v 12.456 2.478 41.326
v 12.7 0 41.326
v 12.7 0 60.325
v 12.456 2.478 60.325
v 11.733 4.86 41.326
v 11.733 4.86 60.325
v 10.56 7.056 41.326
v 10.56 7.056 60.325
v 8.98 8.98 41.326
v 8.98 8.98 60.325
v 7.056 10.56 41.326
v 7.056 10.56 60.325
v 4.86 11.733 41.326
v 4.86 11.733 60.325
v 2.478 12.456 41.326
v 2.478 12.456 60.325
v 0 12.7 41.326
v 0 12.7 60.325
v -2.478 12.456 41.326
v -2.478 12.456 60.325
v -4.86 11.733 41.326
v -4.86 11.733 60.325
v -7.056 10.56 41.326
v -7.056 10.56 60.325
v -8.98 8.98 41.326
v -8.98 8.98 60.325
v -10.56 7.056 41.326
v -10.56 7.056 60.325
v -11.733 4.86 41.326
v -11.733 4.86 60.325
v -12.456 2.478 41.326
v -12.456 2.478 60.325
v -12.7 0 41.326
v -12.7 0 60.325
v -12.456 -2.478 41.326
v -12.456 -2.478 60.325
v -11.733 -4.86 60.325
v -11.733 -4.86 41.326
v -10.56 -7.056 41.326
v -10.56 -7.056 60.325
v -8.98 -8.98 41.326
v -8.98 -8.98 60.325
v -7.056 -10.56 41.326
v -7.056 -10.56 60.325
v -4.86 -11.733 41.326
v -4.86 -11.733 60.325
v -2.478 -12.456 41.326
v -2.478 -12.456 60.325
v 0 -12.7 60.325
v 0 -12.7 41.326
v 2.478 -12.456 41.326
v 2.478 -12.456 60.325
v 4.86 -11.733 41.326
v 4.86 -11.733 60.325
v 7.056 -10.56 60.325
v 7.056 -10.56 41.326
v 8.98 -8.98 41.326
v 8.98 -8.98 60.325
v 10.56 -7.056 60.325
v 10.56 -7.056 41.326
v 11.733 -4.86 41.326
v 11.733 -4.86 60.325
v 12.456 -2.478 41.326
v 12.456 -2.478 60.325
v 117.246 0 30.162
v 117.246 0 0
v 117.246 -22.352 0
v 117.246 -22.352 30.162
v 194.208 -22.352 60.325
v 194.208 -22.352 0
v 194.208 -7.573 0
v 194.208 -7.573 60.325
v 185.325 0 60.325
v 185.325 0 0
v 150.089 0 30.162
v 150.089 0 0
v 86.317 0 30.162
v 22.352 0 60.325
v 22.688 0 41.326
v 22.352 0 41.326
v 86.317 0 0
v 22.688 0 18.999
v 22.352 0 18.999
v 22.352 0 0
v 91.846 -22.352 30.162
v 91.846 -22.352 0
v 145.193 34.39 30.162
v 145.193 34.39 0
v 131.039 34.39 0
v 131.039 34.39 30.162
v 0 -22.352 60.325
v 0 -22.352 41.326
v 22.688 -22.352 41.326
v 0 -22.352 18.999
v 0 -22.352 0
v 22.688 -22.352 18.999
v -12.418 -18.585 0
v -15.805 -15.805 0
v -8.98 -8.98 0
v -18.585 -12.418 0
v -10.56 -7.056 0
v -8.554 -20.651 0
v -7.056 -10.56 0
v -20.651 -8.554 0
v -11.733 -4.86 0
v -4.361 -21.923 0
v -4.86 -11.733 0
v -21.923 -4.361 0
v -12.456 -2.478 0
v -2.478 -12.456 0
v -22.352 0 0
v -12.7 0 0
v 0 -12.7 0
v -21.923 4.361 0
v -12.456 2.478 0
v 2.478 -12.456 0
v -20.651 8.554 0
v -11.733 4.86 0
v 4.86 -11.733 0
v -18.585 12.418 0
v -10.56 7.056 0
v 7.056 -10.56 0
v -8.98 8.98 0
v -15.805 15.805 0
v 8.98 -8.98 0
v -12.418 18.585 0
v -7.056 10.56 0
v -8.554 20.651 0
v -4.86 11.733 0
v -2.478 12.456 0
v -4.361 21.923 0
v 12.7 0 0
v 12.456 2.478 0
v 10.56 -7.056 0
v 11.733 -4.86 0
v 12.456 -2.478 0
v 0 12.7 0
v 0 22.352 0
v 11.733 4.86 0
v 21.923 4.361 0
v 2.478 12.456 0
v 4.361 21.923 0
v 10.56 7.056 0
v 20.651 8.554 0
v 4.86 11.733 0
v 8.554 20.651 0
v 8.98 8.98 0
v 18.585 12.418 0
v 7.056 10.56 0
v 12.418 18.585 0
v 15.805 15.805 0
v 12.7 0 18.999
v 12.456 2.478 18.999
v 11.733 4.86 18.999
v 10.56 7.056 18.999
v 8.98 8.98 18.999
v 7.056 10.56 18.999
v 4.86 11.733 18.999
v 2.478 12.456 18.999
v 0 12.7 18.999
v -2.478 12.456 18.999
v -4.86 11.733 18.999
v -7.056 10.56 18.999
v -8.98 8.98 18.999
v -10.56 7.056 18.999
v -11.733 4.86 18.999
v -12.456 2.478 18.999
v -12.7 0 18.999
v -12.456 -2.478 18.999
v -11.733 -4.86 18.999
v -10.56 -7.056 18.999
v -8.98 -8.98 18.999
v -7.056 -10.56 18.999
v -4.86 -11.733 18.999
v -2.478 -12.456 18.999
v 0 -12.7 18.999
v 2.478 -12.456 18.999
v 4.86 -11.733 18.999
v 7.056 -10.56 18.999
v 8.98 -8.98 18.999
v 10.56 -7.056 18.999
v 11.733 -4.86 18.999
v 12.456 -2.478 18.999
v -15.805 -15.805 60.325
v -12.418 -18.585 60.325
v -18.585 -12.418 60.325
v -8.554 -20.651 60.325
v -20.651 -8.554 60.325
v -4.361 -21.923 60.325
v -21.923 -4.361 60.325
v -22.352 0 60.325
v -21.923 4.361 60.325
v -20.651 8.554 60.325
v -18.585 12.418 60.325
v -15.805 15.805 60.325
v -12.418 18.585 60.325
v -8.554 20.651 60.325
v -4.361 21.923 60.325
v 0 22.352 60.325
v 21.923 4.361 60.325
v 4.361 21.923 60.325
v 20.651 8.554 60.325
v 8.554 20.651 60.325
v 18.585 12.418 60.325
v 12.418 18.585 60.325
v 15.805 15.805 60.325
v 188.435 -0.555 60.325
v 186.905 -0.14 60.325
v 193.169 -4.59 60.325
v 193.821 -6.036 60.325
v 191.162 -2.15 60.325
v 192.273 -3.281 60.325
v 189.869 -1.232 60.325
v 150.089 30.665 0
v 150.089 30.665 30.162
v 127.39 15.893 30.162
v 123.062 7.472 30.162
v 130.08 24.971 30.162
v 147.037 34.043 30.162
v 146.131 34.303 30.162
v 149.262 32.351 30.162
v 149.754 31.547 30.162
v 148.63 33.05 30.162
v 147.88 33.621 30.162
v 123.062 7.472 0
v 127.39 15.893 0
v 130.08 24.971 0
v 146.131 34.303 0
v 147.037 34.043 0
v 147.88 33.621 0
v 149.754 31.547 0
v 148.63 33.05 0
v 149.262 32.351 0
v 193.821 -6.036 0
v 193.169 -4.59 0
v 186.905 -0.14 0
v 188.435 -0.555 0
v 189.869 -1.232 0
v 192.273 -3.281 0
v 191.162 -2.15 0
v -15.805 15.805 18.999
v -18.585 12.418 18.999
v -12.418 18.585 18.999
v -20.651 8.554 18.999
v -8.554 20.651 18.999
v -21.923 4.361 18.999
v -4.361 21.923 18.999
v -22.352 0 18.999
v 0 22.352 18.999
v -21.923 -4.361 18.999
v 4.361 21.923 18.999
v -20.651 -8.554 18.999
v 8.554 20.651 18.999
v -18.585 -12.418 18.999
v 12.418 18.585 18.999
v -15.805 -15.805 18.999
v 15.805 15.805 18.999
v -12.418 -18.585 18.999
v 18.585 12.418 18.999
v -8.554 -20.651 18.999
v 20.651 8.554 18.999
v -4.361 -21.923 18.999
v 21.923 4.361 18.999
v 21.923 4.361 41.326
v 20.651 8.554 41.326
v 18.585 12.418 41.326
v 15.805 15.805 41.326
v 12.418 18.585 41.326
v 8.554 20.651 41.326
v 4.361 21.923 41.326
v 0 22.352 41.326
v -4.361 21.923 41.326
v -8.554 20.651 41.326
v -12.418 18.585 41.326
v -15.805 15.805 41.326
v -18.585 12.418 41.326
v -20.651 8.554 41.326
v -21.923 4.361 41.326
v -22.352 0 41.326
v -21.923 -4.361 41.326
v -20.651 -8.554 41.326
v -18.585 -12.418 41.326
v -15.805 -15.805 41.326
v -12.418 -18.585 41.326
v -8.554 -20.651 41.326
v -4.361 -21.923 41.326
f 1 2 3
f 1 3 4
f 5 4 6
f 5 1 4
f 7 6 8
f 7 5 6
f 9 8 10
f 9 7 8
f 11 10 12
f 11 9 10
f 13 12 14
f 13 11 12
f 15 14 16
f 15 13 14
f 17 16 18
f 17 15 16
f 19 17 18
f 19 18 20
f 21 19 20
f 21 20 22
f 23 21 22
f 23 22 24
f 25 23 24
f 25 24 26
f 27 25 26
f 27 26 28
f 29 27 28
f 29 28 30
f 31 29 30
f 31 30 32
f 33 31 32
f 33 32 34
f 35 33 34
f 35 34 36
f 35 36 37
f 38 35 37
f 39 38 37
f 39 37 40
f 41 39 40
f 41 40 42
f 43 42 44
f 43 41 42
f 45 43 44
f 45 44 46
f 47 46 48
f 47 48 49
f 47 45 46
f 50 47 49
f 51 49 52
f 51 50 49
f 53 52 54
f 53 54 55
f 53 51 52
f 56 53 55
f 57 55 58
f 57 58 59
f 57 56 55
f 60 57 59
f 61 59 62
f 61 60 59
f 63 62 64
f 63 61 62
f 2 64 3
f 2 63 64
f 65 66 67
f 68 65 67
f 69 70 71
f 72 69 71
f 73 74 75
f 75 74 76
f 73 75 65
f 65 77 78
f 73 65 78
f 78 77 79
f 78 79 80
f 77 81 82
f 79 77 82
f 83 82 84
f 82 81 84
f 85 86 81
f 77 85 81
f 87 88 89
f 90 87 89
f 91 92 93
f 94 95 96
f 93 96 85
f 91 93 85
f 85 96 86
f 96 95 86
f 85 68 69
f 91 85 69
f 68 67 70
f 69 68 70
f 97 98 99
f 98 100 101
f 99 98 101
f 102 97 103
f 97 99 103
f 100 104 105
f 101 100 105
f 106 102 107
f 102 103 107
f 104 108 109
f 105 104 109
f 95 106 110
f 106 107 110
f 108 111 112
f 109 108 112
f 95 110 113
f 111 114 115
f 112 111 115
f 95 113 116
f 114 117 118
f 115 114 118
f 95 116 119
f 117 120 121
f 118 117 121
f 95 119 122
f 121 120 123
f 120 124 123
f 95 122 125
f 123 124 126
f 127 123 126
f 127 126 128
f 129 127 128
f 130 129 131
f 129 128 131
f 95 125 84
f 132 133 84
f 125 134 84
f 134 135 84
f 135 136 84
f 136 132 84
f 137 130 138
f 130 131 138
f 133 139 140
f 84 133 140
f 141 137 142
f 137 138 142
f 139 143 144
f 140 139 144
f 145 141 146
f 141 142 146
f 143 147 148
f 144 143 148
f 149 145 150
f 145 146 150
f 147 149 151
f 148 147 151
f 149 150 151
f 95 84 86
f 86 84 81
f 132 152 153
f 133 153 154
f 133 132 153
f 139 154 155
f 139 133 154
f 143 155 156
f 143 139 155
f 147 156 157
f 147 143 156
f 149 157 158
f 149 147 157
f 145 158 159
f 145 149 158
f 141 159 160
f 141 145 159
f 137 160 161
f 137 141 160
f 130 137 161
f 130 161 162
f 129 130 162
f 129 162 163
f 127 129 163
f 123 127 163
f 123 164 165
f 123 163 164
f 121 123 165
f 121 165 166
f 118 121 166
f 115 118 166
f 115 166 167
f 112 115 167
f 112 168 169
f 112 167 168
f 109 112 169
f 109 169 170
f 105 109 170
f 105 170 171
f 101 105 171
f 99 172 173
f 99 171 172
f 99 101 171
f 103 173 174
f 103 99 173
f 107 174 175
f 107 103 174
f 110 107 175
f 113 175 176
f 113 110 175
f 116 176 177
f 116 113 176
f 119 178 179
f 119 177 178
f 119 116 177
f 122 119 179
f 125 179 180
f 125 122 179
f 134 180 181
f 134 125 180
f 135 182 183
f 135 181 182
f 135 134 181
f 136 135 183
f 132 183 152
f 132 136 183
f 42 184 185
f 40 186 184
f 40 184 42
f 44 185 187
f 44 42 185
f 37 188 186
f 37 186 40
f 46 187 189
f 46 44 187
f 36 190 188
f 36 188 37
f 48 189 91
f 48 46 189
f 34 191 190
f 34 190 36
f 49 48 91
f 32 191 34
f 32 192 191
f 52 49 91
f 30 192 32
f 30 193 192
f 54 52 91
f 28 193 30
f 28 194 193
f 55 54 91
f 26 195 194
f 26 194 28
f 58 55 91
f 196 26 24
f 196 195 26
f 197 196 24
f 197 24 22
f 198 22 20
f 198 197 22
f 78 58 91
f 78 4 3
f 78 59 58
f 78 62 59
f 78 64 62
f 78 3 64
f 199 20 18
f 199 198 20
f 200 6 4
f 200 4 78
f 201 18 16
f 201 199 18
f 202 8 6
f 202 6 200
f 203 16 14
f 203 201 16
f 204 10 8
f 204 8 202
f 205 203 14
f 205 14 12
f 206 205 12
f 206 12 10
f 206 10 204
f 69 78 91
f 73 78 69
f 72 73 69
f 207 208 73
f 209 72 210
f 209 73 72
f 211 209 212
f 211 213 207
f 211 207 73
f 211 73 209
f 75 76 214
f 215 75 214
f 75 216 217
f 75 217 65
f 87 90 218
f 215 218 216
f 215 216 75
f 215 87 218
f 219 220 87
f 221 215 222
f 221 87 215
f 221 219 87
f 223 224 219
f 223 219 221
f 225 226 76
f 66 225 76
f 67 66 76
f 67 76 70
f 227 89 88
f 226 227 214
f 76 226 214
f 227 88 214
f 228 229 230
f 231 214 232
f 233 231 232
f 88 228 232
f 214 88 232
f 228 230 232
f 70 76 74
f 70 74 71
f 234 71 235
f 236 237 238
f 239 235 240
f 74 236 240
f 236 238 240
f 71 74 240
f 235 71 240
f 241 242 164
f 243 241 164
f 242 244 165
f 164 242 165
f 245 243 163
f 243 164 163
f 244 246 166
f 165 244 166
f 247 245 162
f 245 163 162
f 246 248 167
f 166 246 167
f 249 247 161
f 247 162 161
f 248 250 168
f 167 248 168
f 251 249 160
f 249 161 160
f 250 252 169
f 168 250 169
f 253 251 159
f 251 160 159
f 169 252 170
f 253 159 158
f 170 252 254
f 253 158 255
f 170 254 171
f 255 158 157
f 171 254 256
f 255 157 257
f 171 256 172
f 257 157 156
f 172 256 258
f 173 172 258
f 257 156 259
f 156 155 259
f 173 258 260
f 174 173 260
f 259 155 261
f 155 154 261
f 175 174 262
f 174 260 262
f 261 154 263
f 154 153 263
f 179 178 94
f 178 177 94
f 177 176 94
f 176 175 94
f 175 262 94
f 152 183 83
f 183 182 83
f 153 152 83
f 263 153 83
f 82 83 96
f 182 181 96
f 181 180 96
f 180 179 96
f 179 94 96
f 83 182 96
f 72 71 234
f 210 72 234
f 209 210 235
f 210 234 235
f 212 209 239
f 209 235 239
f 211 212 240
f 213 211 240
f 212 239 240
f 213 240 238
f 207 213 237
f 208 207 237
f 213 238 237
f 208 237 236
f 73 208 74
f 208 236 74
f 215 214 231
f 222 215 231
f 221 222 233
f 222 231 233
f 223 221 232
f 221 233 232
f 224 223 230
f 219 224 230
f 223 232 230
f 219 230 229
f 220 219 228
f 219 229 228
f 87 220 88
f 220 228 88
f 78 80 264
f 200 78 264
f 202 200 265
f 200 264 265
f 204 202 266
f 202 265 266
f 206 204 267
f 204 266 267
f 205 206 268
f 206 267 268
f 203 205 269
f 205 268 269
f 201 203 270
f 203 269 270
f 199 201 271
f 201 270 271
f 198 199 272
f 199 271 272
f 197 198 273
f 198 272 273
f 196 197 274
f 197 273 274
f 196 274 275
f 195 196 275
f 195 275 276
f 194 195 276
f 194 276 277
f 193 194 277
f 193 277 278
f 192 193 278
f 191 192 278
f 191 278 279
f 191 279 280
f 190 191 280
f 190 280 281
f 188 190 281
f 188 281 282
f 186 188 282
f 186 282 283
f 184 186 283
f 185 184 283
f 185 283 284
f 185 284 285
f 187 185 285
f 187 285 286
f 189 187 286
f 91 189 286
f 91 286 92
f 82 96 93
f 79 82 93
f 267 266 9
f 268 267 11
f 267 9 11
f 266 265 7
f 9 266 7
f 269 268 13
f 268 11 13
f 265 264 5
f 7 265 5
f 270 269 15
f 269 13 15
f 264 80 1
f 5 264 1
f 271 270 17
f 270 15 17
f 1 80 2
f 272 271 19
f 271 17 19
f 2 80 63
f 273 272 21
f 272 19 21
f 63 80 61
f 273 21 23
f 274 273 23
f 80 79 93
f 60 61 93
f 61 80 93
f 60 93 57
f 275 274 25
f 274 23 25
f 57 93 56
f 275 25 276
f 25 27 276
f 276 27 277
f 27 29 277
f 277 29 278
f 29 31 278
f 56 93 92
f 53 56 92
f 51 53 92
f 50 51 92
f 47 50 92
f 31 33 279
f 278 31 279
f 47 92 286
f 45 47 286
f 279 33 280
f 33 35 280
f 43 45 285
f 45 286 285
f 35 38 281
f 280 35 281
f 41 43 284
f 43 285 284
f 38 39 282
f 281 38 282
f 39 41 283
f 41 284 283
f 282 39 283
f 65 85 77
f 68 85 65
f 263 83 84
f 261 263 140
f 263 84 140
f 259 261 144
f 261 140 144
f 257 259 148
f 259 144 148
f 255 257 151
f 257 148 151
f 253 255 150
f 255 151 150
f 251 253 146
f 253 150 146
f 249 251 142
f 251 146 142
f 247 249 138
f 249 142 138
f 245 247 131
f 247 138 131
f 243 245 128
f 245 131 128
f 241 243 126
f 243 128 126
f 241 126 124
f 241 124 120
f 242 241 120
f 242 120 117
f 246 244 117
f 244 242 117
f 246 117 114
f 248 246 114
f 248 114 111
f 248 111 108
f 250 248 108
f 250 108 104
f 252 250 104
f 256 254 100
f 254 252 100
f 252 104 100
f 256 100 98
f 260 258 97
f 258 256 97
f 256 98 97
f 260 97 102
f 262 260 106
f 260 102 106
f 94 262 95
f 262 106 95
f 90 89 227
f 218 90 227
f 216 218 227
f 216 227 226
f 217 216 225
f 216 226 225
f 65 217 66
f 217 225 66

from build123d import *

# Parameters (mm, degrees)
F0_R     = 12.7
F1_DEPTH = 60.325
F2_DEPTH = 30.1625
F3_W     = 31.937063
F3_H     = 22.3266
F3_W_2   = 22.687722
F4_DEPTH = 56.743083
F6_DEPTH = 30.1625


with BuildPart() as f1:
    # F0 (on Top) → F1 (new body)
    with BuildSketch(Plane.XY):
        with BuildLine():
            Line((85.852, 0), (22.352, 0))
            ThreePointArc((22.352, 0), (-15.805251, 15.805251), (0, -22.352))
            Line((0, -22.352), (91.8464, -22.352))
            Line((91.8464, -22.352), (85.852, 0))
        make_face()
        Circle(F0_R, mode=Mode.SUBTRACT)
        Polygon((117.2464, 0), (85.852, 0), (91.8464, -22.352), (117.2464, -22.352), align=None)
        with BuildLine():
            Line((150.0886, 0), (117.2464, 0))
            Line((117.2464, 0), (117.2464, -22.352))
            Line((117.2464, -22.352), (194.2084, -22.352))
            Line((194.2084, -22.352), (194.2084, -7.573048))
            ThreePointArc((194.2084, -7.573048), (191.161905, -2.150228), (185.325414, 0))
            Line((185.325414, 0), (162.975117, 0))
            Line((162.975117, 0), (150.0886, 0))
        make_face()
    extrude(amount=F1_DEPTH)

    # F0 (on Top) → F2 (join)
    with BuildSketch(Plane.XY):
        with BuildLine():
            Line((85.852, 0), (22.352, 0))
            ThreePointArc((22.352, 0), (-15.805251, 15.805251), (0, -22.352))
            Line((0, -22.352), (91.8464, -22.352))
            Line((91.8464, -22.352), (85.852, 0))
        make_face()
        Circle(F0_R, mode=Mode.SUBTRACT)
        Polygon((117.2464, 0), (85.852, 0), (91.8464, -22.352), (117.2464, -22.352), align=None)
        with BuildLine():
            Line((150.0886, 0), (117.2464, 0))
            Line((117.2464, 0), (117.2464, -22.352))
            Line((117.2464, -22.352), (194.2084, -22.352))
            Line((194.2084, -22.352), (194.2084, -7.573048))
            ThreePointArc((194.2084, -7.573048), (191.161905, -2.150228), (185.325414, 0))
            Line((185.325414, 0), (162.975117, 0))
            Line((162.975117, 0), (150.0886, 0))
        make_face()
        with BuildLine():
            ThreePointArc((131.0386, 34.390083), (127.389769, 15.892719), (117.2464, 0))
            Line((117.2464, 0), (150.0886, 0))
            Line((150.0886, 0), (150.0886, 30.665313))
            ThreePointArc((150.0886, 30.665313), (148.268569, 33.353038), (145.192709, 34.390083))
            Line((145.192709, 34.390083), (131.0386, 34.390083))
        make_face()
    extrude(amount=F2_DEPTH)

    # F3 (on face) → F4 (cut, through all)
    with BuildSketch(Plane.XZ.offset(22.352)):
        with Locations((-15.968531, 30.1625)):
            Rectangle(F3_W, F3_H)
        with Locations((11.343861, 30.1625)):
            Rectangle(F3_W_2, F3_H)
    extrude(amount=-F4_DEPTH, mode=Mode.SUBTRACT)

    # F5 (on face) → F6 (cut)
    with BuildSketch(Plane(origin=(0, 0, 0), x_dir=(1, 0, 0), z_dir=(0, 0, -1))):
        Polygon((86.316593, 0), (117.2464, 0), (117.2464, 22.352), (91.8464, 22.352), align=None)
    extrude(amount=-F6_DEPTH, mode=Mode.SUBTRACT)


solid = f1.part
